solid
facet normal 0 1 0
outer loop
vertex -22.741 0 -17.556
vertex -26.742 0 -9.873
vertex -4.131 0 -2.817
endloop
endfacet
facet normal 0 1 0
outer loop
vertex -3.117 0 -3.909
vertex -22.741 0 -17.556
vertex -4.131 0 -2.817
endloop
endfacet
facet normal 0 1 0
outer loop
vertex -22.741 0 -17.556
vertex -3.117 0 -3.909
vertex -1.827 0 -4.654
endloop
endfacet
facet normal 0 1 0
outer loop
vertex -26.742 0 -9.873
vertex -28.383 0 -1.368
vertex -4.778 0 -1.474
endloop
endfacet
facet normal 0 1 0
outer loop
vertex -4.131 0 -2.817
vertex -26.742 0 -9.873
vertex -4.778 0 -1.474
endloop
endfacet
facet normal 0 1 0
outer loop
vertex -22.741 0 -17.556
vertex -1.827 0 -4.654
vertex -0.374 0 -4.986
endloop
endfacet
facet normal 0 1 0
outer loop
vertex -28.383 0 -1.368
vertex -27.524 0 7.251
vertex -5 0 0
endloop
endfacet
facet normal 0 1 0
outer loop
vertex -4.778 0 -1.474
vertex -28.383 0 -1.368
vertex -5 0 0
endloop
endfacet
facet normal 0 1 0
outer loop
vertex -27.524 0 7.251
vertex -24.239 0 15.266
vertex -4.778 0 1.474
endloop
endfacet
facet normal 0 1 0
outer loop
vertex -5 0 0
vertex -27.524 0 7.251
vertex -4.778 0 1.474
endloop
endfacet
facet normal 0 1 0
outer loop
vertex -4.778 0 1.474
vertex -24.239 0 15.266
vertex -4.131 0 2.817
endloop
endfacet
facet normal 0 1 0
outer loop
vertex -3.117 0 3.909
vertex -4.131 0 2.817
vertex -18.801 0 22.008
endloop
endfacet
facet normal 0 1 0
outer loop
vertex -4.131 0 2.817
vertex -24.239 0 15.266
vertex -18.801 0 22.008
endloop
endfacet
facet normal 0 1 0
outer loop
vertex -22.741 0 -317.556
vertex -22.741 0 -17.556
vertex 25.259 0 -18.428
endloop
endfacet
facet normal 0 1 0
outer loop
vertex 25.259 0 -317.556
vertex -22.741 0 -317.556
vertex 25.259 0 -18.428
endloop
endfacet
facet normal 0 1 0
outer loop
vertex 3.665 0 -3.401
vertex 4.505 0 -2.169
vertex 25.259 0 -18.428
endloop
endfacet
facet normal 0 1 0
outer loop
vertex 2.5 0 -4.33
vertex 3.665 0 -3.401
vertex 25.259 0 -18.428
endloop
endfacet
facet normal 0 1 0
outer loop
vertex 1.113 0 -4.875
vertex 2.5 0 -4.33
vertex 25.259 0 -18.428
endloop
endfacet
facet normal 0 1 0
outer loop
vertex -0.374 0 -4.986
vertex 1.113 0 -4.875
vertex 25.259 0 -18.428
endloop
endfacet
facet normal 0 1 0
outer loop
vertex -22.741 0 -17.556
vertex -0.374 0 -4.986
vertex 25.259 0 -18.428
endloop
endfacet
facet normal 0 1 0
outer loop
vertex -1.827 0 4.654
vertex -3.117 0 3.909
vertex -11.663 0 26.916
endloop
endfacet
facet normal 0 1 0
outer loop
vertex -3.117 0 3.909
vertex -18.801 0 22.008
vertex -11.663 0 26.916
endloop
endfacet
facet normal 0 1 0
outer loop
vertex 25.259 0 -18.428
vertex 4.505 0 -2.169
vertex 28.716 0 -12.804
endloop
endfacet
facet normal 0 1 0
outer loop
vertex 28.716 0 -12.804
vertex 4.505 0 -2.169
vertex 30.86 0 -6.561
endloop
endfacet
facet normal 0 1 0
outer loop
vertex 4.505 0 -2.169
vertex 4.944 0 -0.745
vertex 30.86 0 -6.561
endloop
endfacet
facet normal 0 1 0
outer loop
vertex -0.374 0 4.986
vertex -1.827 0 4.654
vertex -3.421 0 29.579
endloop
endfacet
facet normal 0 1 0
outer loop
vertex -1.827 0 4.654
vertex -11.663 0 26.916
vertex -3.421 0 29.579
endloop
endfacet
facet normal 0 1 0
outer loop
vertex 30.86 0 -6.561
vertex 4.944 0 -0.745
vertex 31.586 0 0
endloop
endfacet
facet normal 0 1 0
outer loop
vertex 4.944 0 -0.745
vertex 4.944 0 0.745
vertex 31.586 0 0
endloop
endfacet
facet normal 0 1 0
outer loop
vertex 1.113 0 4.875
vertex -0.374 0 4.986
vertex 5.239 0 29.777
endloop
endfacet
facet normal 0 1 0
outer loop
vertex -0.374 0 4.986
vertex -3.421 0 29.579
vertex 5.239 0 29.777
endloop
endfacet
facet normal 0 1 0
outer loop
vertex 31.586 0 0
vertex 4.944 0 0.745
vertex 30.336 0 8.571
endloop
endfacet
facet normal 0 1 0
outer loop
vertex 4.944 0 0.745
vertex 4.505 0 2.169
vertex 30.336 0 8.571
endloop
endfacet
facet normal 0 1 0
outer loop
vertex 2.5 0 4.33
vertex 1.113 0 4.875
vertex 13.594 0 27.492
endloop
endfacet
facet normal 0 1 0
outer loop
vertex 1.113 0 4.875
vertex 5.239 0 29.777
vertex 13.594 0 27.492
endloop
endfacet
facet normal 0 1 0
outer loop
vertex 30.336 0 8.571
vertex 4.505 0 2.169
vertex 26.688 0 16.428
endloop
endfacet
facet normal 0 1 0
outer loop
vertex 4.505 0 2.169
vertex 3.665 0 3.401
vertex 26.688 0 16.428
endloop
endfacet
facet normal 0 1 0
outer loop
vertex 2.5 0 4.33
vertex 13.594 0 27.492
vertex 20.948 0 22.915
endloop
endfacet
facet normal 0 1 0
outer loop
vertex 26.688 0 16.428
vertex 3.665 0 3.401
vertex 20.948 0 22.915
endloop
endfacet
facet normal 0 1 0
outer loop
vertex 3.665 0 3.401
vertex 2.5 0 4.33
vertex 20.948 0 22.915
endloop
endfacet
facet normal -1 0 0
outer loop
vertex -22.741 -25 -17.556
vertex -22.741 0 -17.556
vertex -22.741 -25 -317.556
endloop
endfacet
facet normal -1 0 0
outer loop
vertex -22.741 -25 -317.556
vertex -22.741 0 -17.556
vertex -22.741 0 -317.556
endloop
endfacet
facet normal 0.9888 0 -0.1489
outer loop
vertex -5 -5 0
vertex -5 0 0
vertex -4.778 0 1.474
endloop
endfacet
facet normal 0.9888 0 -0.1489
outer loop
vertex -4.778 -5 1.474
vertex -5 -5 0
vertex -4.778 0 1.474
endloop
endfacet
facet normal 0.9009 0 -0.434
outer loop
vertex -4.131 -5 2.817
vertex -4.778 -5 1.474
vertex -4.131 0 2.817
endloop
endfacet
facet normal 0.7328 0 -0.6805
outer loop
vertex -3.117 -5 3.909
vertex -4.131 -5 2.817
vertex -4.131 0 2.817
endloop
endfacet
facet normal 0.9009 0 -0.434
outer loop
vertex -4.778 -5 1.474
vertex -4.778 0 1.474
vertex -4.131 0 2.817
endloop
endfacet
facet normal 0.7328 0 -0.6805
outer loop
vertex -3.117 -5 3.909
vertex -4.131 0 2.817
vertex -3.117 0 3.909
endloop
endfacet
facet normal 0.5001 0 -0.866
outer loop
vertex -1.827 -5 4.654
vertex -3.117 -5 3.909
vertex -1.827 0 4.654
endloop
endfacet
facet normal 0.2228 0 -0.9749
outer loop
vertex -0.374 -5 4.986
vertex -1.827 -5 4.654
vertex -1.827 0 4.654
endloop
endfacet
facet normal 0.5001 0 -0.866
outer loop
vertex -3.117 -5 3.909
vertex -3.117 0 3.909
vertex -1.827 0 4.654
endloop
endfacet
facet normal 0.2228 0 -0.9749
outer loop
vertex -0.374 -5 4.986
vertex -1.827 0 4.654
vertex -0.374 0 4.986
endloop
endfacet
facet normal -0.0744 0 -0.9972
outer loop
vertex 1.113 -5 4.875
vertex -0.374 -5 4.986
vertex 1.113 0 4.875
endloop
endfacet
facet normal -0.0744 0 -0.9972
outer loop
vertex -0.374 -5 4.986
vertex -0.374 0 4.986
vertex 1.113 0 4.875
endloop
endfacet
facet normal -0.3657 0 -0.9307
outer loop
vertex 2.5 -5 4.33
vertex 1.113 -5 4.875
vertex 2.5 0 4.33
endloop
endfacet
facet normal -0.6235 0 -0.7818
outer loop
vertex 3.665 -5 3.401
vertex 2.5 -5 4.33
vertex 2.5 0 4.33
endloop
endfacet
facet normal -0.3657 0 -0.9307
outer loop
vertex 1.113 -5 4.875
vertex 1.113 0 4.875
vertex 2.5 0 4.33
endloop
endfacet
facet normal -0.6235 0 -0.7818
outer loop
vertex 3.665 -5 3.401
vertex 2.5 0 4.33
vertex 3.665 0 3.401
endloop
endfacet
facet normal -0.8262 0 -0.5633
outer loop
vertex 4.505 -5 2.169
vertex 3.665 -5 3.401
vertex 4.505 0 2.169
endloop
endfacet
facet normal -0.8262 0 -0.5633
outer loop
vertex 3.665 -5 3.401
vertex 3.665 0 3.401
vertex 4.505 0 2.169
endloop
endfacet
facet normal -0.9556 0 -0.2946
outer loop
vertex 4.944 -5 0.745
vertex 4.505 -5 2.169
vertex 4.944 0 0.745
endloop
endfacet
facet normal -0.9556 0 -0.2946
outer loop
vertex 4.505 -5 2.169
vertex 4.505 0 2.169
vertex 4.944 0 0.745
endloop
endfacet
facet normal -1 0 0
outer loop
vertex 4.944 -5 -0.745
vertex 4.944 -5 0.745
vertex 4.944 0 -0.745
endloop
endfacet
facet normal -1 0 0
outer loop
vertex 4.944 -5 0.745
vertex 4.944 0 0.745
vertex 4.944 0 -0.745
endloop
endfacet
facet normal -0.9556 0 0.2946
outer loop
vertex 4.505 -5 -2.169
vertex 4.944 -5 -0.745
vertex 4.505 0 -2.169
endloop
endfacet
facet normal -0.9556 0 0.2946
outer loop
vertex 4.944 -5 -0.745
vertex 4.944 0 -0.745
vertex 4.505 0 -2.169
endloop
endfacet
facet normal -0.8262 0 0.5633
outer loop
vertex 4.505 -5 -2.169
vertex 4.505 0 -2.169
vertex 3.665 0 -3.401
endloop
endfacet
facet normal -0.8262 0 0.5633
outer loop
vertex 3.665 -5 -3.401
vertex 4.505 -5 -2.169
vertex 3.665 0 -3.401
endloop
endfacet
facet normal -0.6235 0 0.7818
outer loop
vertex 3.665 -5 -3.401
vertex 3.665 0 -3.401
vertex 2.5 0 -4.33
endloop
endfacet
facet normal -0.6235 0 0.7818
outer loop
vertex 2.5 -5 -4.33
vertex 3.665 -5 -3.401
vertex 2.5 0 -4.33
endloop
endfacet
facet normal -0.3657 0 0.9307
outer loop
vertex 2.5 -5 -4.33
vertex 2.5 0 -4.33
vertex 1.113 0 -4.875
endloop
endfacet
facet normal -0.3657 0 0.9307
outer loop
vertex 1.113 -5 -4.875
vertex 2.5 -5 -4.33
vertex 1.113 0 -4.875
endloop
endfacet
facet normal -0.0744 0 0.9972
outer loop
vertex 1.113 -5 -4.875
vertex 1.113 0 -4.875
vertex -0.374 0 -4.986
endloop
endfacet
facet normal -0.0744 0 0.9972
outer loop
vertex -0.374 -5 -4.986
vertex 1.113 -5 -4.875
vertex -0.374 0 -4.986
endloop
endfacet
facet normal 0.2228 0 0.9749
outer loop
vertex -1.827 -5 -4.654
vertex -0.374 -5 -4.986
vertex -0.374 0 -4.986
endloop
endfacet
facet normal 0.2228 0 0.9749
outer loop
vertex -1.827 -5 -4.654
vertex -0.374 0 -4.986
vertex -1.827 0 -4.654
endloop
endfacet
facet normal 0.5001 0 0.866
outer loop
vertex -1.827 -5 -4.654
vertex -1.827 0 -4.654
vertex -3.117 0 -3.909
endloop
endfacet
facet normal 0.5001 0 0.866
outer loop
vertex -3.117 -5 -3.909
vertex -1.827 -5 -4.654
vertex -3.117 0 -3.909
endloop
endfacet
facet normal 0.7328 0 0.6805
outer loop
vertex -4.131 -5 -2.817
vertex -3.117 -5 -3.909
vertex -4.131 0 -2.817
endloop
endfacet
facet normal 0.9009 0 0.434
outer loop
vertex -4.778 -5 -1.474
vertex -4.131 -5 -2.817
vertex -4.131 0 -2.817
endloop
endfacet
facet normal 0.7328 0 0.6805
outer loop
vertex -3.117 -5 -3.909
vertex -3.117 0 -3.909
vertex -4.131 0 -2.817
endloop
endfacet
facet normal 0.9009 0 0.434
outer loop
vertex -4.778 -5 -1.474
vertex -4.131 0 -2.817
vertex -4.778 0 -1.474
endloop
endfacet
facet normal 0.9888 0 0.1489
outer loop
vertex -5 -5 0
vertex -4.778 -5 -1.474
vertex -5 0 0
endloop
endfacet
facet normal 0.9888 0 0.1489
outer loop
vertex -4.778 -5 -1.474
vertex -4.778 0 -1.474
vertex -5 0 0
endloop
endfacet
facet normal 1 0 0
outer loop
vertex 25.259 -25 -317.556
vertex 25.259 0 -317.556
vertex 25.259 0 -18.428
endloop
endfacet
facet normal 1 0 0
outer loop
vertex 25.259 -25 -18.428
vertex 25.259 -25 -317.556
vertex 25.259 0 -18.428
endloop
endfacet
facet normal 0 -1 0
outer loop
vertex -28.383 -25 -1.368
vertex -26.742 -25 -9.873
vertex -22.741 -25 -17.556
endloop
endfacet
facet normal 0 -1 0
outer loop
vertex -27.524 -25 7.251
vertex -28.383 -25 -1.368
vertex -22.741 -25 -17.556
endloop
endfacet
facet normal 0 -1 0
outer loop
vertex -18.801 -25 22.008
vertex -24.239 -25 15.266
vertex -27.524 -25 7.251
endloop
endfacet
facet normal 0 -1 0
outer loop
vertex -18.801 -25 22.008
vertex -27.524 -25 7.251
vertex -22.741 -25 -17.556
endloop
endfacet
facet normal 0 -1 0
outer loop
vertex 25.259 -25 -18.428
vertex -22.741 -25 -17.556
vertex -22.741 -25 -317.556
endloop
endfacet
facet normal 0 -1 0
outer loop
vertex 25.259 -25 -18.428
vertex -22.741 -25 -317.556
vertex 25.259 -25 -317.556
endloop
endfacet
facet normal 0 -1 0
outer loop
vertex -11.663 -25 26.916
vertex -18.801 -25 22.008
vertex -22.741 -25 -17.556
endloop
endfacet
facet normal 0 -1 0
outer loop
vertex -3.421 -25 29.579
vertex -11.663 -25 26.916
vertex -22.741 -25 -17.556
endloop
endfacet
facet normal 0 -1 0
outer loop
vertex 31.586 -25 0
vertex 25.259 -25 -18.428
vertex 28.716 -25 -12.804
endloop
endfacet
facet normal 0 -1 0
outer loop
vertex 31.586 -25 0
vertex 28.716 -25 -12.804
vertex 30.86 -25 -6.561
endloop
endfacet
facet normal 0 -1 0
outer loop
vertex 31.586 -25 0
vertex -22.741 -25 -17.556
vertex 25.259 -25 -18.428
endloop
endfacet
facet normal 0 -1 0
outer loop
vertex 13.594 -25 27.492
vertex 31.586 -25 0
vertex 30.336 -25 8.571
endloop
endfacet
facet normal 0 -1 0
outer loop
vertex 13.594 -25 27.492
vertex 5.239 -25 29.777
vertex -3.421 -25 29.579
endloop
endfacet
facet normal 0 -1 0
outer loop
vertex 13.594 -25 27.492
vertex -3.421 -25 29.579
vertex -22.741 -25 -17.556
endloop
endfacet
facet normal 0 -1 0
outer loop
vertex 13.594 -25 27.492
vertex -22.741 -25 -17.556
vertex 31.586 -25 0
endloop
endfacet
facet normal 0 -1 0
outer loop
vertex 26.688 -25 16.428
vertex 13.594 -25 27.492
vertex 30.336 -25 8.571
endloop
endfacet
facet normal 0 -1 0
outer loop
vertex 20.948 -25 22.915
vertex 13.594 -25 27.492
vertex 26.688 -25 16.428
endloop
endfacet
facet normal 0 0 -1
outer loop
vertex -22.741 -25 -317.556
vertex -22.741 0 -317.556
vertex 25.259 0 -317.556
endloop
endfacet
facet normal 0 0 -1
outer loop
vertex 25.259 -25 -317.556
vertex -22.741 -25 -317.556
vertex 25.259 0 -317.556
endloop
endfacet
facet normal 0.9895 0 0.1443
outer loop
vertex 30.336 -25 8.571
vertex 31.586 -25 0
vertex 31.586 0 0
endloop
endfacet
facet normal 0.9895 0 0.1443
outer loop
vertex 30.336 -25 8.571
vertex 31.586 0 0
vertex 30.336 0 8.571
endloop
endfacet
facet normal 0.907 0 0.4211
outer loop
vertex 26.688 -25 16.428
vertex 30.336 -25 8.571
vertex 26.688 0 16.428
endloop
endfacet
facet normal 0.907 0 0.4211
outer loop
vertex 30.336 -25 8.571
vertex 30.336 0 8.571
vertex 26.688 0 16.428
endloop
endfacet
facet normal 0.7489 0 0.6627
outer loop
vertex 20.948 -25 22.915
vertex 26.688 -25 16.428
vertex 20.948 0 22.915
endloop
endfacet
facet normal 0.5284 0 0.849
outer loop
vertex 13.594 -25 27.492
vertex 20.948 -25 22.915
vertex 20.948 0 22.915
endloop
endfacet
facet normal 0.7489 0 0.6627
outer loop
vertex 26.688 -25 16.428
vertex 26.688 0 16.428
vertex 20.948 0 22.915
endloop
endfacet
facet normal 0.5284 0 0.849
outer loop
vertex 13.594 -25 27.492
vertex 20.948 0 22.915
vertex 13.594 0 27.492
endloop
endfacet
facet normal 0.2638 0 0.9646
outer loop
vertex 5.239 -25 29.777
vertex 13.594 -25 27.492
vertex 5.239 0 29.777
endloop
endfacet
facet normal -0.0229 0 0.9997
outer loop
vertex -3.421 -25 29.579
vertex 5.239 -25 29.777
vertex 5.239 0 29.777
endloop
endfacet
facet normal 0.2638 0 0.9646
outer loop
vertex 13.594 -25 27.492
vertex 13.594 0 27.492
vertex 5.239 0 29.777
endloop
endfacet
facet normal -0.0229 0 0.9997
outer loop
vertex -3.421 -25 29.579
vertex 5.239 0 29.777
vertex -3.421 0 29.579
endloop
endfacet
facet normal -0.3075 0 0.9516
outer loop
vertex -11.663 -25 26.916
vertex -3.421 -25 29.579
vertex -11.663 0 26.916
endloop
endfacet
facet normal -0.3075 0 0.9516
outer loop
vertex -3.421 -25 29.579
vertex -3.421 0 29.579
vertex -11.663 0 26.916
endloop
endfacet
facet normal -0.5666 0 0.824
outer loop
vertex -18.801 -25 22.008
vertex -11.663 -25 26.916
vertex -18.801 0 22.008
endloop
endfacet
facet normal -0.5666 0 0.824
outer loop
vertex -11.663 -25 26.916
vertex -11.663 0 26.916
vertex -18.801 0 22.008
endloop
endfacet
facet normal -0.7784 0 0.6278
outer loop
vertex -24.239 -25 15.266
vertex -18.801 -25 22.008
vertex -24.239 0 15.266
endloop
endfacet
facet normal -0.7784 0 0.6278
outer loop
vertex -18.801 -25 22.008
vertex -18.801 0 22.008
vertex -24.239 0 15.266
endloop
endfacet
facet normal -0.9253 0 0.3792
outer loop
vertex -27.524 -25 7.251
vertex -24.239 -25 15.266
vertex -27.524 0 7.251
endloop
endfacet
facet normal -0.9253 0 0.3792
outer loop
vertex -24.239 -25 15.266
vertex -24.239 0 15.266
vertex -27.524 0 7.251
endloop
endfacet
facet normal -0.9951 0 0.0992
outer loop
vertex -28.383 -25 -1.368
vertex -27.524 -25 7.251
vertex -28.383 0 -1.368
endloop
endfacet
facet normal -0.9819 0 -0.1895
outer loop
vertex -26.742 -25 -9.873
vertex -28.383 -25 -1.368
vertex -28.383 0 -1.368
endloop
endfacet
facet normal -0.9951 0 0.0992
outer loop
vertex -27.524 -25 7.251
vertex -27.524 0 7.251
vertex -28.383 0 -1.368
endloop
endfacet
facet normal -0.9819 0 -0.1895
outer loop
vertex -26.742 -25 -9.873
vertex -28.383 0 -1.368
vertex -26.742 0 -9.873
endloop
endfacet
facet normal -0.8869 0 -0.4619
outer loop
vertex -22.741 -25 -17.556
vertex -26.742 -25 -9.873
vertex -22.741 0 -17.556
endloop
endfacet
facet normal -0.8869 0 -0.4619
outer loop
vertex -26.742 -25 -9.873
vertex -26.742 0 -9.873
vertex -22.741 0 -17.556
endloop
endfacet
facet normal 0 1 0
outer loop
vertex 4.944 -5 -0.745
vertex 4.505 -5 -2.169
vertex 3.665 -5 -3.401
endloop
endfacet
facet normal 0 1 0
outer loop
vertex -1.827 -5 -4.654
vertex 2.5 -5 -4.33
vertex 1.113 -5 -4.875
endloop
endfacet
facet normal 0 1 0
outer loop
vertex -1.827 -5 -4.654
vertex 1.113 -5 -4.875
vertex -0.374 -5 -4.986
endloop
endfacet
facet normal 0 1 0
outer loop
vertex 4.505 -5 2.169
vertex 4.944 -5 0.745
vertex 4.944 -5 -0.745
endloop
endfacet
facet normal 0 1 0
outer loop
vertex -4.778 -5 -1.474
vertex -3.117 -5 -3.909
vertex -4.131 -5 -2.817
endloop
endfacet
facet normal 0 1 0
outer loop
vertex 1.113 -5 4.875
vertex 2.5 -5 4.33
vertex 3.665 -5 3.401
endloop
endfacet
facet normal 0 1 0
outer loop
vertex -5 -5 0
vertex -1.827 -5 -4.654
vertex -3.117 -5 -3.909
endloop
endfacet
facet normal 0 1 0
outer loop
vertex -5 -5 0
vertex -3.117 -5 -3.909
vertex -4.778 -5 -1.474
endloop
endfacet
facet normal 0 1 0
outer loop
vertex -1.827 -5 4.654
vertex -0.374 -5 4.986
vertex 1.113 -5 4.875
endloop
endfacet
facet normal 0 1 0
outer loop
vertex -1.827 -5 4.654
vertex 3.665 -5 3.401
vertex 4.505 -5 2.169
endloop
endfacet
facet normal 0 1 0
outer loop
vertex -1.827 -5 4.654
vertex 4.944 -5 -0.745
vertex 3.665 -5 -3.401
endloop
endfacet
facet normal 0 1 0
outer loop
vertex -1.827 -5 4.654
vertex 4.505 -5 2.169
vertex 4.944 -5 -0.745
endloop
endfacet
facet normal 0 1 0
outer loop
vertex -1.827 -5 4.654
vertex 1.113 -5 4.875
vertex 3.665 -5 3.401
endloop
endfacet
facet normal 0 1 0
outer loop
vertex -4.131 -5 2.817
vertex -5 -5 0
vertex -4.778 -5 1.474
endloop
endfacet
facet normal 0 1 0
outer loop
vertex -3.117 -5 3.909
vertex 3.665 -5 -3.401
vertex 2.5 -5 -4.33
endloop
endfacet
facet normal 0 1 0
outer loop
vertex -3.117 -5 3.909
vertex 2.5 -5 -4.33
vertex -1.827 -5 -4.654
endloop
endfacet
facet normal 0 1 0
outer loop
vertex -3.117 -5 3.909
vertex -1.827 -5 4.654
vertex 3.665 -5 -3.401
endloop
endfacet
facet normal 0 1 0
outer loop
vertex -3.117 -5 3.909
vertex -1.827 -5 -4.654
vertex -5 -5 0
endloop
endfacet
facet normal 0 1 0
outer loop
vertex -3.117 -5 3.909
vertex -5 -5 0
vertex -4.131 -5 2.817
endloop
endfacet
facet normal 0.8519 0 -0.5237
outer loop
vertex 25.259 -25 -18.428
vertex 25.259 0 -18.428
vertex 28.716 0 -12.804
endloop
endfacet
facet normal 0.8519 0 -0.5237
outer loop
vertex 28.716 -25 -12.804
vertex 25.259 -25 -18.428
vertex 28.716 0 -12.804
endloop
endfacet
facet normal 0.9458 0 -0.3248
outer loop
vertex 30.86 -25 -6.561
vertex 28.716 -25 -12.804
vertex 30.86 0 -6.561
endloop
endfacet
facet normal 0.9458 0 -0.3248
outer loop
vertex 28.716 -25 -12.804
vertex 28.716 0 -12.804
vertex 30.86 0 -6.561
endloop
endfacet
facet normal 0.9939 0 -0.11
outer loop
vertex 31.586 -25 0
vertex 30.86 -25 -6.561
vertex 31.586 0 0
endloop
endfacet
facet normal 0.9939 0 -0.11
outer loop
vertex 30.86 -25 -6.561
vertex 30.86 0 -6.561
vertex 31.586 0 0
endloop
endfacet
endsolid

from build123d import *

# Parameters (mm, degrees)
F1_DEPTH = 25
F2_R     = 5
F3_DEPTH = 5


with BuildPart() as f1:
    # F0 (on Front) → F1 (new body)
    with BuildSketch(Plane.XZ):
        with BuildLine():
            ThreePointArc((25.259304, -18.427804), (29.960421, -9.741836), (31.586196, 0))
            ThreePointArc((31.586196, 0), (-7.638587, 28.546513), (-22.740696, -17.555692))
            Line((-22.740696, -17.555692), (25.259304, -17.555692))
            Line((25.259304, -17.555692), (25.259304, -18.427804))
        make_face()
        with BuildLine():
            Line((25.259304, -17.555692), (-22.740696, -17.555692))
            ThreePointArc((-22.740696, -17.555692), (1.041216, -29.99505), (25.259304, -18.427804))
            Line((25.259304, -18.427804), (25.259304, -17.555692))
        make_face()
        with BuildLine():
            ThreePointArc((25.259304, -18.427804), (1.041216, -29.99505), (-22.740696, -17.555692))
            Line((-22.740696, -17.555692), (-22.740696, -317.555692))
            Line((-22.740696, -317.555692), (25.259304, -317.555692))
            Line((25.259304, -317.555692), (25.259304, -18.427804))
        make_face()
    extrude(amount=F1_DEPTH)

    # F2 (on face) → F3 (cut)
    with BuildSketch(Plane(origin=(0, 0, 0), x_dir=(-1, 0, 0), z_dir=(0, 1, 0))):
        Circle(F2_R)
    extrude(amount=-F3_DEPTH, mode=Mode.SUBTRACT)


solid = f1.part
